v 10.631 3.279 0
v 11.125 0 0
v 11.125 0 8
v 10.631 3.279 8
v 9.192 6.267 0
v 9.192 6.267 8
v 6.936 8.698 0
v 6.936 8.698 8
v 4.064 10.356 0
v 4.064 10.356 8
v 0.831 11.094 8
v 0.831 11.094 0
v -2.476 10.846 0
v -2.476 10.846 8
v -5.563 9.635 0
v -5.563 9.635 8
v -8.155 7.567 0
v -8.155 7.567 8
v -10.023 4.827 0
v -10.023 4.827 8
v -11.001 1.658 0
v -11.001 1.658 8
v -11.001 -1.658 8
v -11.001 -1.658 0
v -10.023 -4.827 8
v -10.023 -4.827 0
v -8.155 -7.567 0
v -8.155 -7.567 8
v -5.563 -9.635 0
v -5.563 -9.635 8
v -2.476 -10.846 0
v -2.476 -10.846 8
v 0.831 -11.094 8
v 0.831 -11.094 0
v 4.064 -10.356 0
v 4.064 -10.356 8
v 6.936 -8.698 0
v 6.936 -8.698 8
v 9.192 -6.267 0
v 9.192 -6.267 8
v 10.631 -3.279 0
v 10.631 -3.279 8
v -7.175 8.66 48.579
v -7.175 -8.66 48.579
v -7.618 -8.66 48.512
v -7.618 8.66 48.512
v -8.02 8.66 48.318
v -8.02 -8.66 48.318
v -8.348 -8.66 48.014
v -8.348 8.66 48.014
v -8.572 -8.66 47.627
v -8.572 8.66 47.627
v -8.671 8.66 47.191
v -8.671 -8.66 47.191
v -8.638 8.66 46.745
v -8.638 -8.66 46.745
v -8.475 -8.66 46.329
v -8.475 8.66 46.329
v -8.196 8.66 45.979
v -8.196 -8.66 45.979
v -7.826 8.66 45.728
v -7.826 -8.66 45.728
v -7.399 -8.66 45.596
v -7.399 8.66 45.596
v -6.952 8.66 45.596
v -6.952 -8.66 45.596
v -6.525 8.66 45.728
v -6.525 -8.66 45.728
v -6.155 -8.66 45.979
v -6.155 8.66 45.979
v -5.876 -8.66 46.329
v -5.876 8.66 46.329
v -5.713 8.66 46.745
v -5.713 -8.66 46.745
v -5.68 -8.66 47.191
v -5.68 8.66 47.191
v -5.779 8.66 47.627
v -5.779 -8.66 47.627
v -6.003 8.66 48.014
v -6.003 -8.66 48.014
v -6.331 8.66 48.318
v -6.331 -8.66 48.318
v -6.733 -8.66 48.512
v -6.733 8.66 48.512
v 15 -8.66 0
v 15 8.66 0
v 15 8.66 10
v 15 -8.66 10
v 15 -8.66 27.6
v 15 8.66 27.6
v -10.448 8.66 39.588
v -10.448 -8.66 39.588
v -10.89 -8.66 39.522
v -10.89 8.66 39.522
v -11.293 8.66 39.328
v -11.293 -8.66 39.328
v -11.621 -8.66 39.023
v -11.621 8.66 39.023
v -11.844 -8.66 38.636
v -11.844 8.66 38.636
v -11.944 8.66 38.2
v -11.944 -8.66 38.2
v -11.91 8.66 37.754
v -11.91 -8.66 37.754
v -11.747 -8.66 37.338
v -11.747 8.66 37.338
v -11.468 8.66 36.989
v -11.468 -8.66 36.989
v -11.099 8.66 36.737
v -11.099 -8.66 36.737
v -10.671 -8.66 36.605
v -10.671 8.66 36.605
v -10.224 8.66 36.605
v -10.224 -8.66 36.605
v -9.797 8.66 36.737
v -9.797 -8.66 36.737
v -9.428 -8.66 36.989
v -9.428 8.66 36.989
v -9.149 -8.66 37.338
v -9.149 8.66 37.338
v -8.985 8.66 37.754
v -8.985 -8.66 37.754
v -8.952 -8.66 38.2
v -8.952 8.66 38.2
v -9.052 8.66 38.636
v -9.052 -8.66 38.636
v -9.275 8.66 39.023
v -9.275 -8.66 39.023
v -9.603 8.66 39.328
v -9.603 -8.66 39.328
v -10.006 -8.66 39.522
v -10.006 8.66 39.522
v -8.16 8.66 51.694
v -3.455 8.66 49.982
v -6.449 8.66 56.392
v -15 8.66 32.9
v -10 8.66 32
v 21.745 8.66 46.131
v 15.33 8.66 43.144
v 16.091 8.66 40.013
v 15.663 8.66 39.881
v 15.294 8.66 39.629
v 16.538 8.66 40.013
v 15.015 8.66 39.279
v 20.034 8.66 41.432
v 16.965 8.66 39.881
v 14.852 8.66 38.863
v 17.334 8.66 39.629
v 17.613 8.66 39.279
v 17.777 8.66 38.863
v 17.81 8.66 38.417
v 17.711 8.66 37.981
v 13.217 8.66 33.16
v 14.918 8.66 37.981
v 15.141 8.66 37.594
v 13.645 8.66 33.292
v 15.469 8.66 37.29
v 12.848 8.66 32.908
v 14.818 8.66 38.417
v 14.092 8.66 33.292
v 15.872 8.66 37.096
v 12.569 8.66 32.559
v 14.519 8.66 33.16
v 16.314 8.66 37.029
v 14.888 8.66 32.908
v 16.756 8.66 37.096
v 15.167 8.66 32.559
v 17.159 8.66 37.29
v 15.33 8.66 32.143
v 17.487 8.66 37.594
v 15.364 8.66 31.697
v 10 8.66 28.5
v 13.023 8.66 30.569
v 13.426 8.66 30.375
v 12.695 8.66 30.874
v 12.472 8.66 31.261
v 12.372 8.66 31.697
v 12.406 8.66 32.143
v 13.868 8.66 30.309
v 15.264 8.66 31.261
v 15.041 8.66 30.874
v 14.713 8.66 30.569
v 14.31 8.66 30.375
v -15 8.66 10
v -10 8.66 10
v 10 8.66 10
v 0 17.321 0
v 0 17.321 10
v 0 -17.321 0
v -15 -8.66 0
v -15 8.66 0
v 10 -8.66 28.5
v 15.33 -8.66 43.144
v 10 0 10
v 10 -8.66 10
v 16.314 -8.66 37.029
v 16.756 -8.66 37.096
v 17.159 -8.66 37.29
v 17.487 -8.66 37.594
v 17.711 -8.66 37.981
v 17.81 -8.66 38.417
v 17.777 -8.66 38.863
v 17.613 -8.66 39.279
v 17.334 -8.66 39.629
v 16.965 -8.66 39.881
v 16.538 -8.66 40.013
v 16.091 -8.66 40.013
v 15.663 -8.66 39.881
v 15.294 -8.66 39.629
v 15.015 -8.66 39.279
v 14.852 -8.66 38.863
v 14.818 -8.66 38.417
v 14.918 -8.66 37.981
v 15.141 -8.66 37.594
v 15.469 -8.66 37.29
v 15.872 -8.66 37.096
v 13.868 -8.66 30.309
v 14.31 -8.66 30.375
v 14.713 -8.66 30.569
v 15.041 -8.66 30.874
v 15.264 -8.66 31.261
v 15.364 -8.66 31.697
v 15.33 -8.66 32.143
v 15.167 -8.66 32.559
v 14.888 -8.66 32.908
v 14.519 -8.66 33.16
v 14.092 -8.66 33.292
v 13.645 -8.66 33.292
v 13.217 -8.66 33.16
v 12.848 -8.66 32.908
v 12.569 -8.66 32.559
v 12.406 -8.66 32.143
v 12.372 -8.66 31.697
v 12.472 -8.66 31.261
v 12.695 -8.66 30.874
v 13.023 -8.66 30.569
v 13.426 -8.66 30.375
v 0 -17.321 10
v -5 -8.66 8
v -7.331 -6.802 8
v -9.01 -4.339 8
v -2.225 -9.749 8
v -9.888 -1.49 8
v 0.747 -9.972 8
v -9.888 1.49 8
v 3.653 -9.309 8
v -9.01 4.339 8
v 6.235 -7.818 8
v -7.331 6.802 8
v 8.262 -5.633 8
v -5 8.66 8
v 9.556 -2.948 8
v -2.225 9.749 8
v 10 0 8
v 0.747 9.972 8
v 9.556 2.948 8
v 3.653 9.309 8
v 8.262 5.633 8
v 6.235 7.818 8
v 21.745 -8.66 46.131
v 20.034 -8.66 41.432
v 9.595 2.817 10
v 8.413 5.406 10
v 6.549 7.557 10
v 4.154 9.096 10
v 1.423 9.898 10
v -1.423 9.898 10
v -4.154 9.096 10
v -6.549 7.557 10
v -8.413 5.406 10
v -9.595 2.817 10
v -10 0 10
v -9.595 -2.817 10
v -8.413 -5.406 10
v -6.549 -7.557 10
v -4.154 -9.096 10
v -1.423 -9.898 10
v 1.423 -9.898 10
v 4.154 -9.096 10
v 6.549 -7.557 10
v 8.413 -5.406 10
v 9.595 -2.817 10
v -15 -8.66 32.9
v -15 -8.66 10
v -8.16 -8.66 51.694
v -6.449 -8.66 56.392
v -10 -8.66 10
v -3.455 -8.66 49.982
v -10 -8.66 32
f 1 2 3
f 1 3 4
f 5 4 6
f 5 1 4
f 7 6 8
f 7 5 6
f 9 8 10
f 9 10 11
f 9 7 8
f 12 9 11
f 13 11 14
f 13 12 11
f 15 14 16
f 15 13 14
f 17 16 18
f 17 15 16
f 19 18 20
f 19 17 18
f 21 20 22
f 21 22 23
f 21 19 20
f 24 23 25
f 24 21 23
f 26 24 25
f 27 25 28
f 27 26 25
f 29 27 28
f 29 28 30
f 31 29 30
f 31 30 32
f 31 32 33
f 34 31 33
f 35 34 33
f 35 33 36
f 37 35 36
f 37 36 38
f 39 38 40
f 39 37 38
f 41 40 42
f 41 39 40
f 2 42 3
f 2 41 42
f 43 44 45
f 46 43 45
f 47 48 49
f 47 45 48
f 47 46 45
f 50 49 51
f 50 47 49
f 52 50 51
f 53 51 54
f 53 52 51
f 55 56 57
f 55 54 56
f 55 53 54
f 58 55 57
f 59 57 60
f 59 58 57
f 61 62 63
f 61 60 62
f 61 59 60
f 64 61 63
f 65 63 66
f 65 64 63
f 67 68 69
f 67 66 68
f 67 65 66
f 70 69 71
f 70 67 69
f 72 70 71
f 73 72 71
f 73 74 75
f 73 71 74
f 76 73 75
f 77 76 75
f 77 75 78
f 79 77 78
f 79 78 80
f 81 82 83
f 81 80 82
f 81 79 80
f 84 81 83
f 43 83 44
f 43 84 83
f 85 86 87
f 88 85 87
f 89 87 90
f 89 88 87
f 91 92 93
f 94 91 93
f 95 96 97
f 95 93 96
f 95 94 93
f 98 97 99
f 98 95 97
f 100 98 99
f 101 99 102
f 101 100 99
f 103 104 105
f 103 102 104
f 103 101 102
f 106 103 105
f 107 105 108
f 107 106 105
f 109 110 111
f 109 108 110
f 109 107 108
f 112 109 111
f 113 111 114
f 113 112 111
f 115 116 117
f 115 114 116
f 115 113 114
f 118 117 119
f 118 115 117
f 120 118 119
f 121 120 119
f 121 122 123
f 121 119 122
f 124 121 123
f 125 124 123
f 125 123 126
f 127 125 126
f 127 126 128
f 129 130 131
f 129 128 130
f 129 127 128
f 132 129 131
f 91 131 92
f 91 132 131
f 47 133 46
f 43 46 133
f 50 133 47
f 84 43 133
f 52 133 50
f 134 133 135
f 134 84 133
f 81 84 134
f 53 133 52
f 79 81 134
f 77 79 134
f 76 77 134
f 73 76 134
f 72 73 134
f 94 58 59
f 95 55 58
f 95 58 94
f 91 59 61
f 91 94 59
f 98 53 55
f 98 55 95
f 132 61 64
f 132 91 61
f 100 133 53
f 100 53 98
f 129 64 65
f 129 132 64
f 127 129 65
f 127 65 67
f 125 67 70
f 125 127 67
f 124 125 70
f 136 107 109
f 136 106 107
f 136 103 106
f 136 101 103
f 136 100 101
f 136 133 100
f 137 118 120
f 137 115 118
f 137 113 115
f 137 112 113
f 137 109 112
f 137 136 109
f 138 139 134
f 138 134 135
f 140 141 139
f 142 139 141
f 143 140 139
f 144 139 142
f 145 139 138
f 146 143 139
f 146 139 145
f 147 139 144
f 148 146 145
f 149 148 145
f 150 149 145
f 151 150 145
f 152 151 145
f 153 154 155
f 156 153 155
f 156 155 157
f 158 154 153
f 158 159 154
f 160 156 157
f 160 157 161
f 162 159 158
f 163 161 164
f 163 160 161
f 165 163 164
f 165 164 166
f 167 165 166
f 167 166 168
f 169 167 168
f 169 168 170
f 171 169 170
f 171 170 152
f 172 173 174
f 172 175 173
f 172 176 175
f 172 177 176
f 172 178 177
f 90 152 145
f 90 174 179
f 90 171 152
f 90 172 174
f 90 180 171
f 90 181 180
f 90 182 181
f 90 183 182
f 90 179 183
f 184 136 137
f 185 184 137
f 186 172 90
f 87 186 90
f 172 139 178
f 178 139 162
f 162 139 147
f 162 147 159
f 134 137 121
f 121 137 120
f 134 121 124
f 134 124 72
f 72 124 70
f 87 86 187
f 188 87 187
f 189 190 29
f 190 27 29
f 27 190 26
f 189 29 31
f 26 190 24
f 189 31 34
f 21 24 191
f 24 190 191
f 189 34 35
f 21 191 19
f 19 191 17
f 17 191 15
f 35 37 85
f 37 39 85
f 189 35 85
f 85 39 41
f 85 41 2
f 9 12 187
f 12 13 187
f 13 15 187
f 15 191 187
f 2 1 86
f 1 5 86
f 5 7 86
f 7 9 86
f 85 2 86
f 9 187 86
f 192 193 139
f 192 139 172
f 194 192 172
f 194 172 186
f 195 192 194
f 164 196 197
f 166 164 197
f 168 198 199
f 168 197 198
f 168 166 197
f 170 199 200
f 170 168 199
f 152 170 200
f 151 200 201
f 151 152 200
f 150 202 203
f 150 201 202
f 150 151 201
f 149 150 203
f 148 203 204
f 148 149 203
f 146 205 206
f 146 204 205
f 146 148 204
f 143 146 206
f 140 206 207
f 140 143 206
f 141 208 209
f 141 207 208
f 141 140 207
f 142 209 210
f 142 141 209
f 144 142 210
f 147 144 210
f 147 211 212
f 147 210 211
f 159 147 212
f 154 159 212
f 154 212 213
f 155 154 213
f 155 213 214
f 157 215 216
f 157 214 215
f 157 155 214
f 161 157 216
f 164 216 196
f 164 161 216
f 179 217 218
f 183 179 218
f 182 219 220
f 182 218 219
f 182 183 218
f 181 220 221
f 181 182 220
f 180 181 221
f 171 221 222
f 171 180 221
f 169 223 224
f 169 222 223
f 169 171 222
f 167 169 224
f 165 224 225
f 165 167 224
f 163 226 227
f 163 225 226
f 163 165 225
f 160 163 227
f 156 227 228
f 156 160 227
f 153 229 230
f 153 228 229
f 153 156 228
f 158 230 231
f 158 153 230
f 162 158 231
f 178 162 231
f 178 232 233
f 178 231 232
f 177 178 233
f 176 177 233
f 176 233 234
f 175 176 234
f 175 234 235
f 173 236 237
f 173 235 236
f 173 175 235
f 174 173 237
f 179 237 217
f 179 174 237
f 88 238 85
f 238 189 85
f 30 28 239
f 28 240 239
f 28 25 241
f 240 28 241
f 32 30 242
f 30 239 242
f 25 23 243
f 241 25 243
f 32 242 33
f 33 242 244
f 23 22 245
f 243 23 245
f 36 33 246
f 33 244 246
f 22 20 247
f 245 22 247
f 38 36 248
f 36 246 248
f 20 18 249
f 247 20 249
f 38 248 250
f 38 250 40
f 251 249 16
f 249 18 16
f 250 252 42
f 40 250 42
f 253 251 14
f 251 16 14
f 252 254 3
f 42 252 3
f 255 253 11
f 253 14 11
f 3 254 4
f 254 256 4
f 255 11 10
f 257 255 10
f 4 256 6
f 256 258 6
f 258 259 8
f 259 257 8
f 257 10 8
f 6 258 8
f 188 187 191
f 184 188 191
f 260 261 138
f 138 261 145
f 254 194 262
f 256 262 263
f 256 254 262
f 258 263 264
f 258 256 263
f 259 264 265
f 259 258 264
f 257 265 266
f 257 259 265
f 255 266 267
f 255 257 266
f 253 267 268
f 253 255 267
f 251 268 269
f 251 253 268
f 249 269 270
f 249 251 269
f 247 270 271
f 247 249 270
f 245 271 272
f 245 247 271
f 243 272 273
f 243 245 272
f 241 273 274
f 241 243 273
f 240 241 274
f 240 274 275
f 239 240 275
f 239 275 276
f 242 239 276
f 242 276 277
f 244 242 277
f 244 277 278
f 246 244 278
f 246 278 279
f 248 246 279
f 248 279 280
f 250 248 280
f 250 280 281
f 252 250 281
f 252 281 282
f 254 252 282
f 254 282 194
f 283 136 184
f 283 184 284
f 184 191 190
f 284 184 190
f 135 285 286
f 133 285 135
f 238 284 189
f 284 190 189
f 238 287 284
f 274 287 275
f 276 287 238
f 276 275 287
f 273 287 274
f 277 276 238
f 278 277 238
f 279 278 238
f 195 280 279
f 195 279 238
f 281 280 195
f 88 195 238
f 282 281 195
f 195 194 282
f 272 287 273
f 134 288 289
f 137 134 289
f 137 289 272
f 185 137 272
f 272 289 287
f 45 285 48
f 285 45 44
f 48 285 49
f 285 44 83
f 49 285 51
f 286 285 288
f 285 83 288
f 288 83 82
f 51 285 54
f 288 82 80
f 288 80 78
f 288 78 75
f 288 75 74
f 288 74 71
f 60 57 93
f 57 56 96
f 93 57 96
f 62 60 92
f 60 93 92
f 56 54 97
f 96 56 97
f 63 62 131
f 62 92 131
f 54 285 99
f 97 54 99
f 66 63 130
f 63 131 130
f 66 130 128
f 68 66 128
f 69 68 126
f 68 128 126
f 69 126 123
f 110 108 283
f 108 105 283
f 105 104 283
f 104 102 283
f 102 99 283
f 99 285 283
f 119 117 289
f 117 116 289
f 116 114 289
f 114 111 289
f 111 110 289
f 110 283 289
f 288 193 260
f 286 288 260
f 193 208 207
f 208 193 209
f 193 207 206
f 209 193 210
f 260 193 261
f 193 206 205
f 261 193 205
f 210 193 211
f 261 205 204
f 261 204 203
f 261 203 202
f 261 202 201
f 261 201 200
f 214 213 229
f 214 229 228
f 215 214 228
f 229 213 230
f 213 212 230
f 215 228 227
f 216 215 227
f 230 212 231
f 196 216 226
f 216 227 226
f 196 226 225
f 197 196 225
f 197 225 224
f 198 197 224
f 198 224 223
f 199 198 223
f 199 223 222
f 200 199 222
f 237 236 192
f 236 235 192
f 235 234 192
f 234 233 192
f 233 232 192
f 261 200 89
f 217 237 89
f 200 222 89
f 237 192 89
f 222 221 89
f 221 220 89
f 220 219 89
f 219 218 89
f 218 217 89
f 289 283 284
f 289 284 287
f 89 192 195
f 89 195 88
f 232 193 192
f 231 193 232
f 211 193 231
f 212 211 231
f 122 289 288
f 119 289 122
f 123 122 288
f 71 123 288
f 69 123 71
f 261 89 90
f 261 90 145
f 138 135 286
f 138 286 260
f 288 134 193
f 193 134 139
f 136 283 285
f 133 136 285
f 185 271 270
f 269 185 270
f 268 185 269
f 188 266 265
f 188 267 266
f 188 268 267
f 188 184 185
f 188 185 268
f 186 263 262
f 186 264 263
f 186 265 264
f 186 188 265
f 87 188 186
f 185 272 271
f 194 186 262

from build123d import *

# Parameters (mm, degrees)
SKETCH1_R                = 11.125
BOSS_EXTRUDE2_DEPTH      = 8
SKETCH2_R                = 10
BOSS_EXTRUDE3_DEPTH      = 2
BOSS_EXTRUDE6_DEPTH      = 8.66
BOSS_EXTRUDE6_DEPTH_BACK = 8.660254
CUT_EXTRUDE2_DEPTH       = 62.226087838
CUT_EXTRUDE2_DEPTH_BACK  = 62.226087838
SKETCH8_R                = 1.5
SKETCH9_W                = 30.003485383
SKETCH9_H                = 17.320254038
BOSS_EXTRUDE7_DEPTH      = 5


with BuildPart() as part:
    # Sketch1 → Boss-Extrude2 (new body)
    with BuildSketch(Plane.XY):
        Polygon((0, 17.320508076), (-15, 8.660254038), (-15, -8.660254038), (0, -17.320508076), (15, -8.660254038), (15, 8.660254038), align=None)
        Circle(SKETCH1_R, mode=Mode.SUBTRACT)
    extrude(amount=BOSS_EXTRUDE2_DEPTH)

    # Sketch2 → Boss-Extrude3 (add)
    with BuildSketch(Plane.XY.offset(8)):
        Polygon((0, 17.320508076), (-15, 8.660254038), (-15, -8.660254038), (0, -17.320508076), (15, -8.660254038), (15, 8.660254038), align=None)
        Circle(SKETCH2_R, mode=Mode.SUBTRACT)
    extrude(amount=BOSS_EXTRUDE3_DEPTH)

    # Sketch6 → Boss-Extrude6 (add, two sides: drawn at the far end of the back side and taken through both)
    with BuildSketch(Plane(origin=(0, 0, 0), x_dir=(1, 0, 0), z_dir=(0, 1, 0)).offset(-BOSS_EXTRUDE6_DEPTH_BACK)):
        Polygon((15, -10), (15, -27.6), (20.034456679, -41.432056045), (15.330091147, -43.144305069), (10, -28.5), (10, -10), align=None)
        Polygon((-15, -10), (-15, -32.9), (-8.159597133, -51.693852416), (-3.455231601, -49.981603391), (-10, -32), (-10, -10), align=None)
    extrude(amount=BOSS_EXTRUDE6_DEPTH + BOSS_EXTRUDE6_DEPTH_BACK)

    # Sketch8 → Cut-Extrude2 (cut, two sides: drawn at the far end of the back side and taken through both)
    with BuildSketch(Plane.XZ.offset(8.660254038).offset(-CUT_EXTRUDE2_DEPTH_BACK)):
        with Locations(Location((-10.44787914, 38.088155725, 0), (0, 0, 90))):
            Circle(SKETCH8_R)
        with Locations(Location((-7.175494941, 47.07895742, 0), (0, 0, 90))):
            Circle(SKETCH8_R)
        with Locations(Location((16.31419334, 38.529410074, 0), (0, 0, 270))):
            Circle(SKETCH8_R)
        with Locations(Location((13.868080573, 31.808770483, 0), (0, 0, 270))):
            Circle(SKETCH8_R)
    extrude(amount=CUT_EXTRUDE2_DEPTH + CUT_EXTRUDE2_DEPTH_BACK, mode=Mode.SUBTRACT)

    # Sketch9 → Boss-Extrude7 (add)
    with BuildSketch(Plane(origin=(15.659592369, 0, 43.024376432), x_dir=(0.9396926207859078, 0, -0.3420201433256706), z_dir=(0.3420201433256706, 0, 0.9396926207859078))):
        with Locations((-10.346109336, -0.000127019)):
            Rectangle(SKETCH9_W, SKETCH9_H)
    extrude(amount=BOSS_EXTRUDE7_DEPTH)


solid = part.part
